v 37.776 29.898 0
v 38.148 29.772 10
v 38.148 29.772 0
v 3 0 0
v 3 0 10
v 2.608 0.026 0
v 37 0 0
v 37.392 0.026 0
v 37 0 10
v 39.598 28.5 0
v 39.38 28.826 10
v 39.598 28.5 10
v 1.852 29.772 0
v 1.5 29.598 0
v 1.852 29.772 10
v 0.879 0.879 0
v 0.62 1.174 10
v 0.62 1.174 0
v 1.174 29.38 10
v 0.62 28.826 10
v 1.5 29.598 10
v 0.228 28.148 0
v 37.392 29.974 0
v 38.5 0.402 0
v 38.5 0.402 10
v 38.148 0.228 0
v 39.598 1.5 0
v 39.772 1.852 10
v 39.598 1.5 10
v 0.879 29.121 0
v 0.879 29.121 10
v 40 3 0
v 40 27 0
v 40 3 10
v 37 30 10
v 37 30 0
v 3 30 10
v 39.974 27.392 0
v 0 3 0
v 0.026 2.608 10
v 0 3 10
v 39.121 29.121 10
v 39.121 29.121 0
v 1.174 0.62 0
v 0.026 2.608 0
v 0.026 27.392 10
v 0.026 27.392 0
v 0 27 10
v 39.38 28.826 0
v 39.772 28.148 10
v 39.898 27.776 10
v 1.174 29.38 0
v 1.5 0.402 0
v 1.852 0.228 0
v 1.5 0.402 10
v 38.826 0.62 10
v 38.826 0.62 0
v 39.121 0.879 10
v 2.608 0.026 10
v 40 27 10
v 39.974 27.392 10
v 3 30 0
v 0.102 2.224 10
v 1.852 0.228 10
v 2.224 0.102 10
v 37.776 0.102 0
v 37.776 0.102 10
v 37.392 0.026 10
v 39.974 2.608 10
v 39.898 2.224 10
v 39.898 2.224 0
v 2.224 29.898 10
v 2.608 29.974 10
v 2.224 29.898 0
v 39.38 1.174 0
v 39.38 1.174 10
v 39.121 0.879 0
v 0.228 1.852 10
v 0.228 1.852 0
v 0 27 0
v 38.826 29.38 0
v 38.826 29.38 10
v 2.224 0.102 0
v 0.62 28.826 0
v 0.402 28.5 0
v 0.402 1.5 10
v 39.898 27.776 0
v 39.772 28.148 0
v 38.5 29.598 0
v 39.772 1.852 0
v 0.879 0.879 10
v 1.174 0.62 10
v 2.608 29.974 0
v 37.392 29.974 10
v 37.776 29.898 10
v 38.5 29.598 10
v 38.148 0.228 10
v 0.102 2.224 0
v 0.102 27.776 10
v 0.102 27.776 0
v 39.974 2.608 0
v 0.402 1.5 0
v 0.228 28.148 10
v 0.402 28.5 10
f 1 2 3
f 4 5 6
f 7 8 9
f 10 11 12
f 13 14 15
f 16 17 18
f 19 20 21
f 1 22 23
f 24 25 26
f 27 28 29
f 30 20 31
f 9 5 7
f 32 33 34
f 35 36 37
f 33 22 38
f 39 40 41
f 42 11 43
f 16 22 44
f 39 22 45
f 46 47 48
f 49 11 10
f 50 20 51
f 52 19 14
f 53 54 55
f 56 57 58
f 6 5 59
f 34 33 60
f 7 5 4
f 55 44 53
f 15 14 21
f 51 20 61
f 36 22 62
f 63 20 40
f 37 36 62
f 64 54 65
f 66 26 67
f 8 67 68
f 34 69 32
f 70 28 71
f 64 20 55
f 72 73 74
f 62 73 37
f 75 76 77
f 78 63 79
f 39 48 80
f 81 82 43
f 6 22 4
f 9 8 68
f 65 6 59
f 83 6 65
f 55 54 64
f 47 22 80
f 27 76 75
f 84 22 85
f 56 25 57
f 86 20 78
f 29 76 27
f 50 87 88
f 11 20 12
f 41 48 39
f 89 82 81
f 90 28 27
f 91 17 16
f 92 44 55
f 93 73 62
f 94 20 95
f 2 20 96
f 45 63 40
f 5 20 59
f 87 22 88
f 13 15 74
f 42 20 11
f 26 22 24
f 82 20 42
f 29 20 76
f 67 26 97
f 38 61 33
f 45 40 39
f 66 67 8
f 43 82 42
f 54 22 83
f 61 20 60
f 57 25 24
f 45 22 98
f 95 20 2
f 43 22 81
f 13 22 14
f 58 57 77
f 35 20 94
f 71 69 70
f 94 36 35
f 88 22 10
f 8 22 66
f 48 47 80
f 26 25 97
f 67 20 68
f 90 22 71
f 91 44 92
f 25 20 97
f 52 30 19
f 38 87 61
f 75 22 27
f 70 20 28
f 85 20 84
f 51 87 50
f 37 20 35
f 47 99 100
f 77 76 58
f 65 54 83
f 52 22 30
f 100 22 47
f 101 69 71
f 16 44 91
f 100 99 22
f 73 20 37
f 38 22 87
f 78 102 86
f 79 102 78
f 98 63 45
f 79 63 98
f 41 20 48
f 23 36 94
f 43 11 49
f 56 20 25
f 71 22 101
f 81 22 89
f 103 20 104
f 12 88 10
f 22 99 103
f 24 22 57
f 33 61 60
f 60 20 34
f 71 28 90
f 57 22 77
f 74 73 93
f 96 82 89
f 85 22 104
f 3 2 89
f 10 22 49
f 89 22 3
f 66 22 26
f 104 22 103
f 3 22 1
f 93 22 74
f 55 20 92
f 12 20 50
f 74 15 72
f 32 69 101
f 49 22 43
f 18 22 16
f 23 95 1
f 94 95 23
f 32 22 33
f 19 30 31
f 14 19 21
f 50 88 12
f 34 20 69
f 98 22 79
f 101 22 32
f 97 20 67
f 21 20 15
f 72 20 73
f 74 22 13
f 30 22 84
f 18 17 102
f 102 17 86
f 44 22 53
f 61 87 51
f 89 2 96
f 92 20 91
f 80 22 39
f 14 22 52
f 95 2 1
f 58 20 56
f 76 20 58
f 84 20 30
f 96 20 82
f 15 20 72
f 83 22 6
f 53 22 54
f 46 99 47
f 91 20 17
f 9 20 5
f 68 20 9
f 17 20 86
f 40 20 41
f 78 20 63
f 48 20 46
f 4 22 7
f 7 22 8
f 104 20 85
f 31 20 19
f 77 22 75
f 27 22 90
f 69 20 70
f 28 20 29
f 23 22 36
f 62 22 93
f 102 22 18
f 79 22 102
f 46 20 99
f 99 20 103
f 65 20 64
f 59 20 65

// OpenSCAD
// file: ../lib/helpers.scad
// ============================================================
// <PROJECT NAME>  |  Shared geometry helpers
// ------------------------------------------------------------
// lib/ holds building blocks that have NO printed part of their own:
// shapes, profiles, joints, and functions reused by several parts.
// Parts reach this file with `use <../lib/helpers.scad>` (modules and
// functions only -- never its top-level variables).
//
// RULES FOR EVERY HELPER (docs/conventions/geometry.md):
//   - Build tapered/rounded solids with hull() of true primitives, not
//     rotate() + linear_extrude(): floating-point rotations are a common
//     source of "not a valid 2-manifold" errors.
//   - Give every module/function a DISTINCTIVE name. The MakerWorld bundle
//     is one flat file where the LAST definition of a name wins silently,
//     including names from bundled libraries (BOSL2 defines e.g. cuboid,
//     dovetail, rounded_prism). Prefix or qualify: rounded_block, not box.
//   - Document the argument contract (units, origin) in a comment above.
//
// REPLACE ME: delete rounded_block() if you do not need it, and add your
// own helpers. Remember: a new lib/ file must also be added to
// SOURCE_FILES in scripts/project_config.sh.
// ============================================================

// A box with rounded vertical edges, authored from its outer
// front-left-bottom corner at the origin (docs/conventions/geometry.md).
//   size : [x, y, z] outer dimensions, mm
//   r    : vertical-edge radius, mm (0 = plain cube)
module rounded_block(size, r = 0) {
    if (r <= 0) {
        cube(size);
    } else {
        hull() {
            for (x = [r, size[0] - r], y = [r, size[1] - r])
                translate([x, y, 0])
                    cylinder(h = size[2], r = r);
        }
    }
}
// file: ../parts/part_template.scad
// ============================================================
// <PROJECT NAME>  |  Part: part_template   (COPY ME for each new part)
// ------------------------------------------------------------
// ONE FILE = ONE PRINTED PART. To add a part (docs/workflows/add-a-part.md):
//   1. copy this file to parts/<part_name>.scad
//   2. rename the module to EXACTLY <part_name> -- the plate validator
//      counts calls to a module named like the file
//   3. add the file to SOURCE_FILES (scripts/project_config.sh)
//   4. place it on a plate: scripts/plates_config.sh AND the matching
//      mw_plate_N() in assembly/assembly_main.scad (the build fails if
//      the two disagree)
//   5. document it: README "Parts to print" table, CHANGELOG [Unreleased]
//
// CONVENTIONS (docs/conventions/geometry.md):
//   - Author the part with its outer FRONT-LEFT-BOTTOM corner at (0,0,0),
//     in its PRINT orientation (flat face down, support-free if possible).
//     Assembly files rotate/translate it into its assembled pose.
//   - Clearances WIDEN THE CAVITY, never shrink the nominal part.
//   - Keep deliberate small overlaps (+0.01..+1) on cuts to avoid
//     coincident faces; comment why each one is there.
// ============================================================

include <../lib/params.scad>   // include: we need its VARIABLES

use <../lib/helpers.scad>      // use: modules/functions only

// REPLACE ME -- the whole body of this module is a placeholder.
// Arguments default to params.scad values so callers can override for
// variants without touching the customizer.
module part_template(size = [size_x, size_y, size_z], r = effective_radius) {
    rounded_block(size, r);
}

// BUILD:EXCLUDE-START (standalone preview only; stripped from every bundle)
// Lets you open THIS file directly in OpenSCAD (and lets render.sh and the
// smoke check export it). Anything a standalone preview needs that the
// build normally injects -- e.g. mw_plate_size -- is defined here.
part_template();
// BUILD:EXCLUDE-END
// file: ../lib/params.scad
// ============================================================
// <PROJECT NAME>  |  Global parameters  (SINGLE SOURCE OF TRUTH)
// ------------------------------------------------------------
// Every other .scad file does `include <../lib/params.scad>` to read these
// variables. Nothing downstream redefines or recomputes them.
//
// THIS FILE IS ALSO THE MAKERWORLD CUSTOMIZER UI. PMM follows the OpenSCAD
// Customizer syntax (docs/openscad/customizer-syntax.md):
//   /* [TAB NAME] */            starts a tab; parameters below belong to it
//   // Help text               the comment line ABOVE a parameter is its
//                              label/help text in the UI
//   x = 10; // [1:0.5:50]      slider: [min:step:max]
//   s = "a"; // [a:Label A, b:Label B]    dropdown (value:Label pairs)
//   flag = true;               checkbox (plain boolean)
//   c = "#FF6600"; // color    PMM color picker -- HEX string ONLY
//   f = "Roboto"; // font      PMM font picker -- name must be in the
//                              INSTALLED inventory (docs/pmm/data/)
//   /* [Hidden] */             everything below is invisible in the UI
//
// BUILD COUPLING (scripts/build/Bundle.psm1): in the MakerWorld bundle,
// comments in every tab EXCEPT [Hidden] are kept verbatim (they are the
// UI help text); comments under [Hidden] are stripped. Write user-facing
// comments for customers, and [Hidden] comments for maintainers.
//
// ORDER OF SECTIONS -- keep it:
//   1. user-facing tabs     (what a MakerWorld customer changes)
//   2. [Hidden] constants   (fixed design values)
//   3. [Hidden] derived     (computed ONCE here, read everywhere)
//
// `mw_plate_size` and `mw_assembly_views` are deliberately NOT defined here:
// the build injects both right after this file (scripts/plates_config.sh:
// MW_PLATE_SIZE, ASSEMBLY_PLATE_VIEWS). Standalone previews of individual
// files that need them must define fallbacks in their BUILD:EXCLUDE block.
//
// See: docs/workflows/add-a-parameter.md, docs/conventions/naming.md
// ============================================================

/* [DIMENSIONS] */

// REPLACE ME -- Overall length (X), in mm
size_x = 40; // [10:1:200]

// REPLACE ME -- Overall depth (Y), in mm
size_y = 30; // [10:1:200]

// REPLACE ME -- Overall height (Z), in mm
size_z = 10; // [2:0.5:100]

/* [OPTIONS] */

// REPLACE ME -- Example checkbox: round the vertical edges
rounded = true;

/* [CLEARANCES - TUNE FOR YOUR PRINTER] */

// Gap added to every mating cavity (mm). Nominal parts are never shrunk.
fit_clearance = 0.15; // [0:0.05:0.6]

/* [Hidden] */

// ---- Fixed design constants (not customer-facing) ----
corner_radius = 3;

// ---- Visualization colors (local previews only) ----
// Named colors are fine HERE because these are never exposed to the PMM UI.
// The MakerWorld build flattens color(<variable>) calls to one uniform hex
// (scripts/project_config.sh FLATTEN_COLORS). A color you DO expose to
// customers must be a hex string with a trailing `// color` comment.
part_color = "SteelBlue";

// ---- Layout spacing ----
// Clear space between consecutive assembled views' bounding boxes on the
// assembly preview plate (mw_assembly_view()). WHICH views appear is not set
// here: `mw_assembly_views` is injected by the build from
// scripts/plates_config.sh ASSEMBLY_PLATE_VIEWS, like mw_plate_size.
assembly_view_gap = 30;

// ---- Render quality ----
// Defaults match what PMM renders. The dev bundle and render pipeline
// override these; keep them as plain `$fa = N;` / `$fs = N;` lines.
$fa = 2;
$fs = 0.4;

// ---- Derived values (single source of truth) ----
// Compute here, once, as plain top-level variables. Never recompute a
// derived value inside a part file -- read it from here instead.
effective_radius = rounded ? min(corner_radius, size_x / 2, size_y / 2) : 0;
// main file
// ============================================================
// <PROJECT NAME>  |  Main assembly + MakerWorld output modules
// ------------------------------------------------------------
// Everything PMM-facing lives in this one file (PLATE_ASSEMBLY_FILE in
// scripts/project_config.sh):
//
//   1. ASSEMBLED VIEWS -- the parts composed in their assembled pose, for
//      local preview and for MakerWorld's assembly view. Each view "<name>"
//      is a module assembly_<name>() plus a function
//      assembly_<name>_footprint() returning its XY box. More views (open,
//      exploded ...) can live here or in their own assembly/*.scad files.
//
//   2. PMM OUTPUT MODULES (docs/pmm/specification.md). PMM calls these
//      ITSELF -- never call them from your own code:
//        mw_plate_1() .. mw_plate_N()  one module per print plate
//        mw_assembly_view()            preview only, NOT exported to 3MF
//
// TRADE-OFF: defining mw_plate_N() turns off PMM's direct STL download for
// this model. For a single-part model, delete every mw_* module, set
// PLATE_ASSEMBLY_FILE="" and MAKERWORLD_TOP_LEVEL_CALL="<part>();" in
// scripts/project_config.sh, and empty ASSEMBLY_PLATE_VIEWS.
//
// VALIDATION (the build fails on either):
//   - each mw_plate_N() body must call the same part modules, the same
//     number of times, as PLATE_N_PARTS in scripts/plates_config.sh
//   - each view in ASSEMBLY_PLATE_VIEWS needs assembly_<name>(),
//     assembly_<name>_footprint(), and a branch in BOTH dispatchers below
//
// PLATE RULES (docs/pmm/compatibility-rules.md):
//   - Center each plate on X/Y (parts are authored from a corner, so
//     translate by -footprint/2), Z resting at 0.
//   - Keep every print plate inside mw_plate_size x mw_plate_size (injected
//     by the build; PMM ceiling about 240 x 235 mm). Wrap many small parts
//     into rows/columns -- oversize plates make 3MF generation fail.
// ============================================================

include <../lib/params.scad>

use <../parts/part_template.scad>

// ---- 1. Assembled views ----------------------------------------------------
// REPLACE ME: compose your parts in their assembled pose.
// A multicolor part should show its colors on the 3mf export's preview plate
// too: call its region modules here, each in its own assembly_region(), the
// same way its BUILD:EXCLUDE block calls them (examples/demo does this).
module assembly_main() {
    color(part_color) part_template();
}

// XY bounding box of assembly_main(), [xmin, ymin, xmax, ymax], in its own
// frame. Keep it in sync with the module -- mw_assembly_view() lays views
// out by these boxes. Share formulas between a view and its footprint via
// functions (e.g. a positions() function both call) so they cannot drift.
function assembly_main_footprint() = [0, 0, size_x, size_y];

// ---- 2. PMM output modules -------------------------------------------------
// REPLACE ME: one mw_plate_N() per entry in PLATE_NAMES (plates_config.sh).
module mw_plate_1() {
    translate([-size_x / 2, -size_y / 2, 0])
        color(part_color) part_template();
}

// ---- 3. Assembly preview plate (mw_assembly_view) ---------------------------
// View-agnostic: it shows the views listed in `mw_assembly_views` (injected
// by the build from ASSEMBLY_PLATE_VIEWS), stacked front to back with
// assembly_view_gap of clear space between bounding boxes, and centers the
// combined group on X/Y. The 3mf export renders the same layout as its
// "_preview assembly DO NOT PRINT" plate, never re-arranged by Bambu Studio.
//
// Adding a view "<name>": define assembly_<name>() and
// assembly_<name>_footprint(), add one branch to EACH dispatcher below, and
// list it in ASSEMBLY_PLATE_VIEWS. (OpenSCAD cannot call a module by name,
// hence the explicit dispatchers.)

// Marks one COLOR REGION of an assembled view, for the 3mf export's preview
// plate -- the assembly-side twin of a multicolor part's top-level region
// calls (docs/workflows/multicolor.md, "The assembly preview plate").
// Wrap every solid of every view in exactly one, OUTSIDE its color():
//     assembly_region("lid")   sliding_lid_body();
// With $assembly_region unset (MakerWorld, previews) it draws its children
// unchanged. The export first sets it to "?" to list the region names, then
// renders one solid per name. A view that uses none is exported as one
// single-color object, as before.
module assembly_region(name) {
    if (is_undef($assembly_region))
        children();
    else if ($assembly_region == "?")
        echo(str("ASSEMBLY_REGION:", name));
    else if ($assembly_region == name)
        children();
}

// Dispatches a view name to its module.
module assembly_view(name) {
    if (name == "main") {
        assembly_main();
    } else {
        echo(str("WARNING: unknown assembly view \"", name, "\" -- skipped"));
    }
}

// Dispatches a view name to its footprint; [0, 0, 0, 0] if unknown.
function assembly_view_footprint(name) =
    name == "main" ? assembly_main_footprint() :
    [0, 0, 0, 0];

// Y offset for each footprint in `fps` so they stack front to back with
// exactly `gap` of clear space between one's back edge (ymax) and the next
// one's front edge (ymin). The first stays at 0.
function assembly_stack_offsets(fps, gap, i = 0, acc = []) =
    i >= len(fps) ? acc :
    assembly_stack_offsets(fps, gap, i + 1, concat(acc, [
        i == 0 ? 0 : acc[i - 1] + fps[i - 1][3] + gap - fps[i][1]
    ]));

// All views share ONE X translate, so parts authored at the same origin in
// every view line up; a bigger view simply widens the group's box.
module mw_assembly_view() {
    views = is_undef(mw_assembly_views) ? [] : mw_assembly_views;
    n = len(views);

    if (n > 0) {
        fps  = [for (v = views) assembly_view_footprint(v)];
        offs = assembly_stack_offsets(fps, assembly_view_gap);

        xmin = min([for (f = fps) f[0]]);
        xmax = max([for (f = fps) f[2]]);
        ymin = min([for (i = [0 : n - 1]) offs[i] + fps[i][1]]);
        ymax = max([for (i = [0 : n - 1]) offs[i] + fps[i][3]]);

        for (i = [0 : n - 1])
            translate([-(xmin + xmax) / 2, -(ymin + ymax) / 2 + offs[i], 0])
                assembly_view(views[i]);
    }
}

// BUILD:EXCLUDE-START (standalone preview only; stripped from every bundle)
mw_plate_size = 235;              // the build injects the real values
mw_assembly_views = ["main"];     // into both bundles
assembly_main();
// BUILD:EXCLUDE-END
